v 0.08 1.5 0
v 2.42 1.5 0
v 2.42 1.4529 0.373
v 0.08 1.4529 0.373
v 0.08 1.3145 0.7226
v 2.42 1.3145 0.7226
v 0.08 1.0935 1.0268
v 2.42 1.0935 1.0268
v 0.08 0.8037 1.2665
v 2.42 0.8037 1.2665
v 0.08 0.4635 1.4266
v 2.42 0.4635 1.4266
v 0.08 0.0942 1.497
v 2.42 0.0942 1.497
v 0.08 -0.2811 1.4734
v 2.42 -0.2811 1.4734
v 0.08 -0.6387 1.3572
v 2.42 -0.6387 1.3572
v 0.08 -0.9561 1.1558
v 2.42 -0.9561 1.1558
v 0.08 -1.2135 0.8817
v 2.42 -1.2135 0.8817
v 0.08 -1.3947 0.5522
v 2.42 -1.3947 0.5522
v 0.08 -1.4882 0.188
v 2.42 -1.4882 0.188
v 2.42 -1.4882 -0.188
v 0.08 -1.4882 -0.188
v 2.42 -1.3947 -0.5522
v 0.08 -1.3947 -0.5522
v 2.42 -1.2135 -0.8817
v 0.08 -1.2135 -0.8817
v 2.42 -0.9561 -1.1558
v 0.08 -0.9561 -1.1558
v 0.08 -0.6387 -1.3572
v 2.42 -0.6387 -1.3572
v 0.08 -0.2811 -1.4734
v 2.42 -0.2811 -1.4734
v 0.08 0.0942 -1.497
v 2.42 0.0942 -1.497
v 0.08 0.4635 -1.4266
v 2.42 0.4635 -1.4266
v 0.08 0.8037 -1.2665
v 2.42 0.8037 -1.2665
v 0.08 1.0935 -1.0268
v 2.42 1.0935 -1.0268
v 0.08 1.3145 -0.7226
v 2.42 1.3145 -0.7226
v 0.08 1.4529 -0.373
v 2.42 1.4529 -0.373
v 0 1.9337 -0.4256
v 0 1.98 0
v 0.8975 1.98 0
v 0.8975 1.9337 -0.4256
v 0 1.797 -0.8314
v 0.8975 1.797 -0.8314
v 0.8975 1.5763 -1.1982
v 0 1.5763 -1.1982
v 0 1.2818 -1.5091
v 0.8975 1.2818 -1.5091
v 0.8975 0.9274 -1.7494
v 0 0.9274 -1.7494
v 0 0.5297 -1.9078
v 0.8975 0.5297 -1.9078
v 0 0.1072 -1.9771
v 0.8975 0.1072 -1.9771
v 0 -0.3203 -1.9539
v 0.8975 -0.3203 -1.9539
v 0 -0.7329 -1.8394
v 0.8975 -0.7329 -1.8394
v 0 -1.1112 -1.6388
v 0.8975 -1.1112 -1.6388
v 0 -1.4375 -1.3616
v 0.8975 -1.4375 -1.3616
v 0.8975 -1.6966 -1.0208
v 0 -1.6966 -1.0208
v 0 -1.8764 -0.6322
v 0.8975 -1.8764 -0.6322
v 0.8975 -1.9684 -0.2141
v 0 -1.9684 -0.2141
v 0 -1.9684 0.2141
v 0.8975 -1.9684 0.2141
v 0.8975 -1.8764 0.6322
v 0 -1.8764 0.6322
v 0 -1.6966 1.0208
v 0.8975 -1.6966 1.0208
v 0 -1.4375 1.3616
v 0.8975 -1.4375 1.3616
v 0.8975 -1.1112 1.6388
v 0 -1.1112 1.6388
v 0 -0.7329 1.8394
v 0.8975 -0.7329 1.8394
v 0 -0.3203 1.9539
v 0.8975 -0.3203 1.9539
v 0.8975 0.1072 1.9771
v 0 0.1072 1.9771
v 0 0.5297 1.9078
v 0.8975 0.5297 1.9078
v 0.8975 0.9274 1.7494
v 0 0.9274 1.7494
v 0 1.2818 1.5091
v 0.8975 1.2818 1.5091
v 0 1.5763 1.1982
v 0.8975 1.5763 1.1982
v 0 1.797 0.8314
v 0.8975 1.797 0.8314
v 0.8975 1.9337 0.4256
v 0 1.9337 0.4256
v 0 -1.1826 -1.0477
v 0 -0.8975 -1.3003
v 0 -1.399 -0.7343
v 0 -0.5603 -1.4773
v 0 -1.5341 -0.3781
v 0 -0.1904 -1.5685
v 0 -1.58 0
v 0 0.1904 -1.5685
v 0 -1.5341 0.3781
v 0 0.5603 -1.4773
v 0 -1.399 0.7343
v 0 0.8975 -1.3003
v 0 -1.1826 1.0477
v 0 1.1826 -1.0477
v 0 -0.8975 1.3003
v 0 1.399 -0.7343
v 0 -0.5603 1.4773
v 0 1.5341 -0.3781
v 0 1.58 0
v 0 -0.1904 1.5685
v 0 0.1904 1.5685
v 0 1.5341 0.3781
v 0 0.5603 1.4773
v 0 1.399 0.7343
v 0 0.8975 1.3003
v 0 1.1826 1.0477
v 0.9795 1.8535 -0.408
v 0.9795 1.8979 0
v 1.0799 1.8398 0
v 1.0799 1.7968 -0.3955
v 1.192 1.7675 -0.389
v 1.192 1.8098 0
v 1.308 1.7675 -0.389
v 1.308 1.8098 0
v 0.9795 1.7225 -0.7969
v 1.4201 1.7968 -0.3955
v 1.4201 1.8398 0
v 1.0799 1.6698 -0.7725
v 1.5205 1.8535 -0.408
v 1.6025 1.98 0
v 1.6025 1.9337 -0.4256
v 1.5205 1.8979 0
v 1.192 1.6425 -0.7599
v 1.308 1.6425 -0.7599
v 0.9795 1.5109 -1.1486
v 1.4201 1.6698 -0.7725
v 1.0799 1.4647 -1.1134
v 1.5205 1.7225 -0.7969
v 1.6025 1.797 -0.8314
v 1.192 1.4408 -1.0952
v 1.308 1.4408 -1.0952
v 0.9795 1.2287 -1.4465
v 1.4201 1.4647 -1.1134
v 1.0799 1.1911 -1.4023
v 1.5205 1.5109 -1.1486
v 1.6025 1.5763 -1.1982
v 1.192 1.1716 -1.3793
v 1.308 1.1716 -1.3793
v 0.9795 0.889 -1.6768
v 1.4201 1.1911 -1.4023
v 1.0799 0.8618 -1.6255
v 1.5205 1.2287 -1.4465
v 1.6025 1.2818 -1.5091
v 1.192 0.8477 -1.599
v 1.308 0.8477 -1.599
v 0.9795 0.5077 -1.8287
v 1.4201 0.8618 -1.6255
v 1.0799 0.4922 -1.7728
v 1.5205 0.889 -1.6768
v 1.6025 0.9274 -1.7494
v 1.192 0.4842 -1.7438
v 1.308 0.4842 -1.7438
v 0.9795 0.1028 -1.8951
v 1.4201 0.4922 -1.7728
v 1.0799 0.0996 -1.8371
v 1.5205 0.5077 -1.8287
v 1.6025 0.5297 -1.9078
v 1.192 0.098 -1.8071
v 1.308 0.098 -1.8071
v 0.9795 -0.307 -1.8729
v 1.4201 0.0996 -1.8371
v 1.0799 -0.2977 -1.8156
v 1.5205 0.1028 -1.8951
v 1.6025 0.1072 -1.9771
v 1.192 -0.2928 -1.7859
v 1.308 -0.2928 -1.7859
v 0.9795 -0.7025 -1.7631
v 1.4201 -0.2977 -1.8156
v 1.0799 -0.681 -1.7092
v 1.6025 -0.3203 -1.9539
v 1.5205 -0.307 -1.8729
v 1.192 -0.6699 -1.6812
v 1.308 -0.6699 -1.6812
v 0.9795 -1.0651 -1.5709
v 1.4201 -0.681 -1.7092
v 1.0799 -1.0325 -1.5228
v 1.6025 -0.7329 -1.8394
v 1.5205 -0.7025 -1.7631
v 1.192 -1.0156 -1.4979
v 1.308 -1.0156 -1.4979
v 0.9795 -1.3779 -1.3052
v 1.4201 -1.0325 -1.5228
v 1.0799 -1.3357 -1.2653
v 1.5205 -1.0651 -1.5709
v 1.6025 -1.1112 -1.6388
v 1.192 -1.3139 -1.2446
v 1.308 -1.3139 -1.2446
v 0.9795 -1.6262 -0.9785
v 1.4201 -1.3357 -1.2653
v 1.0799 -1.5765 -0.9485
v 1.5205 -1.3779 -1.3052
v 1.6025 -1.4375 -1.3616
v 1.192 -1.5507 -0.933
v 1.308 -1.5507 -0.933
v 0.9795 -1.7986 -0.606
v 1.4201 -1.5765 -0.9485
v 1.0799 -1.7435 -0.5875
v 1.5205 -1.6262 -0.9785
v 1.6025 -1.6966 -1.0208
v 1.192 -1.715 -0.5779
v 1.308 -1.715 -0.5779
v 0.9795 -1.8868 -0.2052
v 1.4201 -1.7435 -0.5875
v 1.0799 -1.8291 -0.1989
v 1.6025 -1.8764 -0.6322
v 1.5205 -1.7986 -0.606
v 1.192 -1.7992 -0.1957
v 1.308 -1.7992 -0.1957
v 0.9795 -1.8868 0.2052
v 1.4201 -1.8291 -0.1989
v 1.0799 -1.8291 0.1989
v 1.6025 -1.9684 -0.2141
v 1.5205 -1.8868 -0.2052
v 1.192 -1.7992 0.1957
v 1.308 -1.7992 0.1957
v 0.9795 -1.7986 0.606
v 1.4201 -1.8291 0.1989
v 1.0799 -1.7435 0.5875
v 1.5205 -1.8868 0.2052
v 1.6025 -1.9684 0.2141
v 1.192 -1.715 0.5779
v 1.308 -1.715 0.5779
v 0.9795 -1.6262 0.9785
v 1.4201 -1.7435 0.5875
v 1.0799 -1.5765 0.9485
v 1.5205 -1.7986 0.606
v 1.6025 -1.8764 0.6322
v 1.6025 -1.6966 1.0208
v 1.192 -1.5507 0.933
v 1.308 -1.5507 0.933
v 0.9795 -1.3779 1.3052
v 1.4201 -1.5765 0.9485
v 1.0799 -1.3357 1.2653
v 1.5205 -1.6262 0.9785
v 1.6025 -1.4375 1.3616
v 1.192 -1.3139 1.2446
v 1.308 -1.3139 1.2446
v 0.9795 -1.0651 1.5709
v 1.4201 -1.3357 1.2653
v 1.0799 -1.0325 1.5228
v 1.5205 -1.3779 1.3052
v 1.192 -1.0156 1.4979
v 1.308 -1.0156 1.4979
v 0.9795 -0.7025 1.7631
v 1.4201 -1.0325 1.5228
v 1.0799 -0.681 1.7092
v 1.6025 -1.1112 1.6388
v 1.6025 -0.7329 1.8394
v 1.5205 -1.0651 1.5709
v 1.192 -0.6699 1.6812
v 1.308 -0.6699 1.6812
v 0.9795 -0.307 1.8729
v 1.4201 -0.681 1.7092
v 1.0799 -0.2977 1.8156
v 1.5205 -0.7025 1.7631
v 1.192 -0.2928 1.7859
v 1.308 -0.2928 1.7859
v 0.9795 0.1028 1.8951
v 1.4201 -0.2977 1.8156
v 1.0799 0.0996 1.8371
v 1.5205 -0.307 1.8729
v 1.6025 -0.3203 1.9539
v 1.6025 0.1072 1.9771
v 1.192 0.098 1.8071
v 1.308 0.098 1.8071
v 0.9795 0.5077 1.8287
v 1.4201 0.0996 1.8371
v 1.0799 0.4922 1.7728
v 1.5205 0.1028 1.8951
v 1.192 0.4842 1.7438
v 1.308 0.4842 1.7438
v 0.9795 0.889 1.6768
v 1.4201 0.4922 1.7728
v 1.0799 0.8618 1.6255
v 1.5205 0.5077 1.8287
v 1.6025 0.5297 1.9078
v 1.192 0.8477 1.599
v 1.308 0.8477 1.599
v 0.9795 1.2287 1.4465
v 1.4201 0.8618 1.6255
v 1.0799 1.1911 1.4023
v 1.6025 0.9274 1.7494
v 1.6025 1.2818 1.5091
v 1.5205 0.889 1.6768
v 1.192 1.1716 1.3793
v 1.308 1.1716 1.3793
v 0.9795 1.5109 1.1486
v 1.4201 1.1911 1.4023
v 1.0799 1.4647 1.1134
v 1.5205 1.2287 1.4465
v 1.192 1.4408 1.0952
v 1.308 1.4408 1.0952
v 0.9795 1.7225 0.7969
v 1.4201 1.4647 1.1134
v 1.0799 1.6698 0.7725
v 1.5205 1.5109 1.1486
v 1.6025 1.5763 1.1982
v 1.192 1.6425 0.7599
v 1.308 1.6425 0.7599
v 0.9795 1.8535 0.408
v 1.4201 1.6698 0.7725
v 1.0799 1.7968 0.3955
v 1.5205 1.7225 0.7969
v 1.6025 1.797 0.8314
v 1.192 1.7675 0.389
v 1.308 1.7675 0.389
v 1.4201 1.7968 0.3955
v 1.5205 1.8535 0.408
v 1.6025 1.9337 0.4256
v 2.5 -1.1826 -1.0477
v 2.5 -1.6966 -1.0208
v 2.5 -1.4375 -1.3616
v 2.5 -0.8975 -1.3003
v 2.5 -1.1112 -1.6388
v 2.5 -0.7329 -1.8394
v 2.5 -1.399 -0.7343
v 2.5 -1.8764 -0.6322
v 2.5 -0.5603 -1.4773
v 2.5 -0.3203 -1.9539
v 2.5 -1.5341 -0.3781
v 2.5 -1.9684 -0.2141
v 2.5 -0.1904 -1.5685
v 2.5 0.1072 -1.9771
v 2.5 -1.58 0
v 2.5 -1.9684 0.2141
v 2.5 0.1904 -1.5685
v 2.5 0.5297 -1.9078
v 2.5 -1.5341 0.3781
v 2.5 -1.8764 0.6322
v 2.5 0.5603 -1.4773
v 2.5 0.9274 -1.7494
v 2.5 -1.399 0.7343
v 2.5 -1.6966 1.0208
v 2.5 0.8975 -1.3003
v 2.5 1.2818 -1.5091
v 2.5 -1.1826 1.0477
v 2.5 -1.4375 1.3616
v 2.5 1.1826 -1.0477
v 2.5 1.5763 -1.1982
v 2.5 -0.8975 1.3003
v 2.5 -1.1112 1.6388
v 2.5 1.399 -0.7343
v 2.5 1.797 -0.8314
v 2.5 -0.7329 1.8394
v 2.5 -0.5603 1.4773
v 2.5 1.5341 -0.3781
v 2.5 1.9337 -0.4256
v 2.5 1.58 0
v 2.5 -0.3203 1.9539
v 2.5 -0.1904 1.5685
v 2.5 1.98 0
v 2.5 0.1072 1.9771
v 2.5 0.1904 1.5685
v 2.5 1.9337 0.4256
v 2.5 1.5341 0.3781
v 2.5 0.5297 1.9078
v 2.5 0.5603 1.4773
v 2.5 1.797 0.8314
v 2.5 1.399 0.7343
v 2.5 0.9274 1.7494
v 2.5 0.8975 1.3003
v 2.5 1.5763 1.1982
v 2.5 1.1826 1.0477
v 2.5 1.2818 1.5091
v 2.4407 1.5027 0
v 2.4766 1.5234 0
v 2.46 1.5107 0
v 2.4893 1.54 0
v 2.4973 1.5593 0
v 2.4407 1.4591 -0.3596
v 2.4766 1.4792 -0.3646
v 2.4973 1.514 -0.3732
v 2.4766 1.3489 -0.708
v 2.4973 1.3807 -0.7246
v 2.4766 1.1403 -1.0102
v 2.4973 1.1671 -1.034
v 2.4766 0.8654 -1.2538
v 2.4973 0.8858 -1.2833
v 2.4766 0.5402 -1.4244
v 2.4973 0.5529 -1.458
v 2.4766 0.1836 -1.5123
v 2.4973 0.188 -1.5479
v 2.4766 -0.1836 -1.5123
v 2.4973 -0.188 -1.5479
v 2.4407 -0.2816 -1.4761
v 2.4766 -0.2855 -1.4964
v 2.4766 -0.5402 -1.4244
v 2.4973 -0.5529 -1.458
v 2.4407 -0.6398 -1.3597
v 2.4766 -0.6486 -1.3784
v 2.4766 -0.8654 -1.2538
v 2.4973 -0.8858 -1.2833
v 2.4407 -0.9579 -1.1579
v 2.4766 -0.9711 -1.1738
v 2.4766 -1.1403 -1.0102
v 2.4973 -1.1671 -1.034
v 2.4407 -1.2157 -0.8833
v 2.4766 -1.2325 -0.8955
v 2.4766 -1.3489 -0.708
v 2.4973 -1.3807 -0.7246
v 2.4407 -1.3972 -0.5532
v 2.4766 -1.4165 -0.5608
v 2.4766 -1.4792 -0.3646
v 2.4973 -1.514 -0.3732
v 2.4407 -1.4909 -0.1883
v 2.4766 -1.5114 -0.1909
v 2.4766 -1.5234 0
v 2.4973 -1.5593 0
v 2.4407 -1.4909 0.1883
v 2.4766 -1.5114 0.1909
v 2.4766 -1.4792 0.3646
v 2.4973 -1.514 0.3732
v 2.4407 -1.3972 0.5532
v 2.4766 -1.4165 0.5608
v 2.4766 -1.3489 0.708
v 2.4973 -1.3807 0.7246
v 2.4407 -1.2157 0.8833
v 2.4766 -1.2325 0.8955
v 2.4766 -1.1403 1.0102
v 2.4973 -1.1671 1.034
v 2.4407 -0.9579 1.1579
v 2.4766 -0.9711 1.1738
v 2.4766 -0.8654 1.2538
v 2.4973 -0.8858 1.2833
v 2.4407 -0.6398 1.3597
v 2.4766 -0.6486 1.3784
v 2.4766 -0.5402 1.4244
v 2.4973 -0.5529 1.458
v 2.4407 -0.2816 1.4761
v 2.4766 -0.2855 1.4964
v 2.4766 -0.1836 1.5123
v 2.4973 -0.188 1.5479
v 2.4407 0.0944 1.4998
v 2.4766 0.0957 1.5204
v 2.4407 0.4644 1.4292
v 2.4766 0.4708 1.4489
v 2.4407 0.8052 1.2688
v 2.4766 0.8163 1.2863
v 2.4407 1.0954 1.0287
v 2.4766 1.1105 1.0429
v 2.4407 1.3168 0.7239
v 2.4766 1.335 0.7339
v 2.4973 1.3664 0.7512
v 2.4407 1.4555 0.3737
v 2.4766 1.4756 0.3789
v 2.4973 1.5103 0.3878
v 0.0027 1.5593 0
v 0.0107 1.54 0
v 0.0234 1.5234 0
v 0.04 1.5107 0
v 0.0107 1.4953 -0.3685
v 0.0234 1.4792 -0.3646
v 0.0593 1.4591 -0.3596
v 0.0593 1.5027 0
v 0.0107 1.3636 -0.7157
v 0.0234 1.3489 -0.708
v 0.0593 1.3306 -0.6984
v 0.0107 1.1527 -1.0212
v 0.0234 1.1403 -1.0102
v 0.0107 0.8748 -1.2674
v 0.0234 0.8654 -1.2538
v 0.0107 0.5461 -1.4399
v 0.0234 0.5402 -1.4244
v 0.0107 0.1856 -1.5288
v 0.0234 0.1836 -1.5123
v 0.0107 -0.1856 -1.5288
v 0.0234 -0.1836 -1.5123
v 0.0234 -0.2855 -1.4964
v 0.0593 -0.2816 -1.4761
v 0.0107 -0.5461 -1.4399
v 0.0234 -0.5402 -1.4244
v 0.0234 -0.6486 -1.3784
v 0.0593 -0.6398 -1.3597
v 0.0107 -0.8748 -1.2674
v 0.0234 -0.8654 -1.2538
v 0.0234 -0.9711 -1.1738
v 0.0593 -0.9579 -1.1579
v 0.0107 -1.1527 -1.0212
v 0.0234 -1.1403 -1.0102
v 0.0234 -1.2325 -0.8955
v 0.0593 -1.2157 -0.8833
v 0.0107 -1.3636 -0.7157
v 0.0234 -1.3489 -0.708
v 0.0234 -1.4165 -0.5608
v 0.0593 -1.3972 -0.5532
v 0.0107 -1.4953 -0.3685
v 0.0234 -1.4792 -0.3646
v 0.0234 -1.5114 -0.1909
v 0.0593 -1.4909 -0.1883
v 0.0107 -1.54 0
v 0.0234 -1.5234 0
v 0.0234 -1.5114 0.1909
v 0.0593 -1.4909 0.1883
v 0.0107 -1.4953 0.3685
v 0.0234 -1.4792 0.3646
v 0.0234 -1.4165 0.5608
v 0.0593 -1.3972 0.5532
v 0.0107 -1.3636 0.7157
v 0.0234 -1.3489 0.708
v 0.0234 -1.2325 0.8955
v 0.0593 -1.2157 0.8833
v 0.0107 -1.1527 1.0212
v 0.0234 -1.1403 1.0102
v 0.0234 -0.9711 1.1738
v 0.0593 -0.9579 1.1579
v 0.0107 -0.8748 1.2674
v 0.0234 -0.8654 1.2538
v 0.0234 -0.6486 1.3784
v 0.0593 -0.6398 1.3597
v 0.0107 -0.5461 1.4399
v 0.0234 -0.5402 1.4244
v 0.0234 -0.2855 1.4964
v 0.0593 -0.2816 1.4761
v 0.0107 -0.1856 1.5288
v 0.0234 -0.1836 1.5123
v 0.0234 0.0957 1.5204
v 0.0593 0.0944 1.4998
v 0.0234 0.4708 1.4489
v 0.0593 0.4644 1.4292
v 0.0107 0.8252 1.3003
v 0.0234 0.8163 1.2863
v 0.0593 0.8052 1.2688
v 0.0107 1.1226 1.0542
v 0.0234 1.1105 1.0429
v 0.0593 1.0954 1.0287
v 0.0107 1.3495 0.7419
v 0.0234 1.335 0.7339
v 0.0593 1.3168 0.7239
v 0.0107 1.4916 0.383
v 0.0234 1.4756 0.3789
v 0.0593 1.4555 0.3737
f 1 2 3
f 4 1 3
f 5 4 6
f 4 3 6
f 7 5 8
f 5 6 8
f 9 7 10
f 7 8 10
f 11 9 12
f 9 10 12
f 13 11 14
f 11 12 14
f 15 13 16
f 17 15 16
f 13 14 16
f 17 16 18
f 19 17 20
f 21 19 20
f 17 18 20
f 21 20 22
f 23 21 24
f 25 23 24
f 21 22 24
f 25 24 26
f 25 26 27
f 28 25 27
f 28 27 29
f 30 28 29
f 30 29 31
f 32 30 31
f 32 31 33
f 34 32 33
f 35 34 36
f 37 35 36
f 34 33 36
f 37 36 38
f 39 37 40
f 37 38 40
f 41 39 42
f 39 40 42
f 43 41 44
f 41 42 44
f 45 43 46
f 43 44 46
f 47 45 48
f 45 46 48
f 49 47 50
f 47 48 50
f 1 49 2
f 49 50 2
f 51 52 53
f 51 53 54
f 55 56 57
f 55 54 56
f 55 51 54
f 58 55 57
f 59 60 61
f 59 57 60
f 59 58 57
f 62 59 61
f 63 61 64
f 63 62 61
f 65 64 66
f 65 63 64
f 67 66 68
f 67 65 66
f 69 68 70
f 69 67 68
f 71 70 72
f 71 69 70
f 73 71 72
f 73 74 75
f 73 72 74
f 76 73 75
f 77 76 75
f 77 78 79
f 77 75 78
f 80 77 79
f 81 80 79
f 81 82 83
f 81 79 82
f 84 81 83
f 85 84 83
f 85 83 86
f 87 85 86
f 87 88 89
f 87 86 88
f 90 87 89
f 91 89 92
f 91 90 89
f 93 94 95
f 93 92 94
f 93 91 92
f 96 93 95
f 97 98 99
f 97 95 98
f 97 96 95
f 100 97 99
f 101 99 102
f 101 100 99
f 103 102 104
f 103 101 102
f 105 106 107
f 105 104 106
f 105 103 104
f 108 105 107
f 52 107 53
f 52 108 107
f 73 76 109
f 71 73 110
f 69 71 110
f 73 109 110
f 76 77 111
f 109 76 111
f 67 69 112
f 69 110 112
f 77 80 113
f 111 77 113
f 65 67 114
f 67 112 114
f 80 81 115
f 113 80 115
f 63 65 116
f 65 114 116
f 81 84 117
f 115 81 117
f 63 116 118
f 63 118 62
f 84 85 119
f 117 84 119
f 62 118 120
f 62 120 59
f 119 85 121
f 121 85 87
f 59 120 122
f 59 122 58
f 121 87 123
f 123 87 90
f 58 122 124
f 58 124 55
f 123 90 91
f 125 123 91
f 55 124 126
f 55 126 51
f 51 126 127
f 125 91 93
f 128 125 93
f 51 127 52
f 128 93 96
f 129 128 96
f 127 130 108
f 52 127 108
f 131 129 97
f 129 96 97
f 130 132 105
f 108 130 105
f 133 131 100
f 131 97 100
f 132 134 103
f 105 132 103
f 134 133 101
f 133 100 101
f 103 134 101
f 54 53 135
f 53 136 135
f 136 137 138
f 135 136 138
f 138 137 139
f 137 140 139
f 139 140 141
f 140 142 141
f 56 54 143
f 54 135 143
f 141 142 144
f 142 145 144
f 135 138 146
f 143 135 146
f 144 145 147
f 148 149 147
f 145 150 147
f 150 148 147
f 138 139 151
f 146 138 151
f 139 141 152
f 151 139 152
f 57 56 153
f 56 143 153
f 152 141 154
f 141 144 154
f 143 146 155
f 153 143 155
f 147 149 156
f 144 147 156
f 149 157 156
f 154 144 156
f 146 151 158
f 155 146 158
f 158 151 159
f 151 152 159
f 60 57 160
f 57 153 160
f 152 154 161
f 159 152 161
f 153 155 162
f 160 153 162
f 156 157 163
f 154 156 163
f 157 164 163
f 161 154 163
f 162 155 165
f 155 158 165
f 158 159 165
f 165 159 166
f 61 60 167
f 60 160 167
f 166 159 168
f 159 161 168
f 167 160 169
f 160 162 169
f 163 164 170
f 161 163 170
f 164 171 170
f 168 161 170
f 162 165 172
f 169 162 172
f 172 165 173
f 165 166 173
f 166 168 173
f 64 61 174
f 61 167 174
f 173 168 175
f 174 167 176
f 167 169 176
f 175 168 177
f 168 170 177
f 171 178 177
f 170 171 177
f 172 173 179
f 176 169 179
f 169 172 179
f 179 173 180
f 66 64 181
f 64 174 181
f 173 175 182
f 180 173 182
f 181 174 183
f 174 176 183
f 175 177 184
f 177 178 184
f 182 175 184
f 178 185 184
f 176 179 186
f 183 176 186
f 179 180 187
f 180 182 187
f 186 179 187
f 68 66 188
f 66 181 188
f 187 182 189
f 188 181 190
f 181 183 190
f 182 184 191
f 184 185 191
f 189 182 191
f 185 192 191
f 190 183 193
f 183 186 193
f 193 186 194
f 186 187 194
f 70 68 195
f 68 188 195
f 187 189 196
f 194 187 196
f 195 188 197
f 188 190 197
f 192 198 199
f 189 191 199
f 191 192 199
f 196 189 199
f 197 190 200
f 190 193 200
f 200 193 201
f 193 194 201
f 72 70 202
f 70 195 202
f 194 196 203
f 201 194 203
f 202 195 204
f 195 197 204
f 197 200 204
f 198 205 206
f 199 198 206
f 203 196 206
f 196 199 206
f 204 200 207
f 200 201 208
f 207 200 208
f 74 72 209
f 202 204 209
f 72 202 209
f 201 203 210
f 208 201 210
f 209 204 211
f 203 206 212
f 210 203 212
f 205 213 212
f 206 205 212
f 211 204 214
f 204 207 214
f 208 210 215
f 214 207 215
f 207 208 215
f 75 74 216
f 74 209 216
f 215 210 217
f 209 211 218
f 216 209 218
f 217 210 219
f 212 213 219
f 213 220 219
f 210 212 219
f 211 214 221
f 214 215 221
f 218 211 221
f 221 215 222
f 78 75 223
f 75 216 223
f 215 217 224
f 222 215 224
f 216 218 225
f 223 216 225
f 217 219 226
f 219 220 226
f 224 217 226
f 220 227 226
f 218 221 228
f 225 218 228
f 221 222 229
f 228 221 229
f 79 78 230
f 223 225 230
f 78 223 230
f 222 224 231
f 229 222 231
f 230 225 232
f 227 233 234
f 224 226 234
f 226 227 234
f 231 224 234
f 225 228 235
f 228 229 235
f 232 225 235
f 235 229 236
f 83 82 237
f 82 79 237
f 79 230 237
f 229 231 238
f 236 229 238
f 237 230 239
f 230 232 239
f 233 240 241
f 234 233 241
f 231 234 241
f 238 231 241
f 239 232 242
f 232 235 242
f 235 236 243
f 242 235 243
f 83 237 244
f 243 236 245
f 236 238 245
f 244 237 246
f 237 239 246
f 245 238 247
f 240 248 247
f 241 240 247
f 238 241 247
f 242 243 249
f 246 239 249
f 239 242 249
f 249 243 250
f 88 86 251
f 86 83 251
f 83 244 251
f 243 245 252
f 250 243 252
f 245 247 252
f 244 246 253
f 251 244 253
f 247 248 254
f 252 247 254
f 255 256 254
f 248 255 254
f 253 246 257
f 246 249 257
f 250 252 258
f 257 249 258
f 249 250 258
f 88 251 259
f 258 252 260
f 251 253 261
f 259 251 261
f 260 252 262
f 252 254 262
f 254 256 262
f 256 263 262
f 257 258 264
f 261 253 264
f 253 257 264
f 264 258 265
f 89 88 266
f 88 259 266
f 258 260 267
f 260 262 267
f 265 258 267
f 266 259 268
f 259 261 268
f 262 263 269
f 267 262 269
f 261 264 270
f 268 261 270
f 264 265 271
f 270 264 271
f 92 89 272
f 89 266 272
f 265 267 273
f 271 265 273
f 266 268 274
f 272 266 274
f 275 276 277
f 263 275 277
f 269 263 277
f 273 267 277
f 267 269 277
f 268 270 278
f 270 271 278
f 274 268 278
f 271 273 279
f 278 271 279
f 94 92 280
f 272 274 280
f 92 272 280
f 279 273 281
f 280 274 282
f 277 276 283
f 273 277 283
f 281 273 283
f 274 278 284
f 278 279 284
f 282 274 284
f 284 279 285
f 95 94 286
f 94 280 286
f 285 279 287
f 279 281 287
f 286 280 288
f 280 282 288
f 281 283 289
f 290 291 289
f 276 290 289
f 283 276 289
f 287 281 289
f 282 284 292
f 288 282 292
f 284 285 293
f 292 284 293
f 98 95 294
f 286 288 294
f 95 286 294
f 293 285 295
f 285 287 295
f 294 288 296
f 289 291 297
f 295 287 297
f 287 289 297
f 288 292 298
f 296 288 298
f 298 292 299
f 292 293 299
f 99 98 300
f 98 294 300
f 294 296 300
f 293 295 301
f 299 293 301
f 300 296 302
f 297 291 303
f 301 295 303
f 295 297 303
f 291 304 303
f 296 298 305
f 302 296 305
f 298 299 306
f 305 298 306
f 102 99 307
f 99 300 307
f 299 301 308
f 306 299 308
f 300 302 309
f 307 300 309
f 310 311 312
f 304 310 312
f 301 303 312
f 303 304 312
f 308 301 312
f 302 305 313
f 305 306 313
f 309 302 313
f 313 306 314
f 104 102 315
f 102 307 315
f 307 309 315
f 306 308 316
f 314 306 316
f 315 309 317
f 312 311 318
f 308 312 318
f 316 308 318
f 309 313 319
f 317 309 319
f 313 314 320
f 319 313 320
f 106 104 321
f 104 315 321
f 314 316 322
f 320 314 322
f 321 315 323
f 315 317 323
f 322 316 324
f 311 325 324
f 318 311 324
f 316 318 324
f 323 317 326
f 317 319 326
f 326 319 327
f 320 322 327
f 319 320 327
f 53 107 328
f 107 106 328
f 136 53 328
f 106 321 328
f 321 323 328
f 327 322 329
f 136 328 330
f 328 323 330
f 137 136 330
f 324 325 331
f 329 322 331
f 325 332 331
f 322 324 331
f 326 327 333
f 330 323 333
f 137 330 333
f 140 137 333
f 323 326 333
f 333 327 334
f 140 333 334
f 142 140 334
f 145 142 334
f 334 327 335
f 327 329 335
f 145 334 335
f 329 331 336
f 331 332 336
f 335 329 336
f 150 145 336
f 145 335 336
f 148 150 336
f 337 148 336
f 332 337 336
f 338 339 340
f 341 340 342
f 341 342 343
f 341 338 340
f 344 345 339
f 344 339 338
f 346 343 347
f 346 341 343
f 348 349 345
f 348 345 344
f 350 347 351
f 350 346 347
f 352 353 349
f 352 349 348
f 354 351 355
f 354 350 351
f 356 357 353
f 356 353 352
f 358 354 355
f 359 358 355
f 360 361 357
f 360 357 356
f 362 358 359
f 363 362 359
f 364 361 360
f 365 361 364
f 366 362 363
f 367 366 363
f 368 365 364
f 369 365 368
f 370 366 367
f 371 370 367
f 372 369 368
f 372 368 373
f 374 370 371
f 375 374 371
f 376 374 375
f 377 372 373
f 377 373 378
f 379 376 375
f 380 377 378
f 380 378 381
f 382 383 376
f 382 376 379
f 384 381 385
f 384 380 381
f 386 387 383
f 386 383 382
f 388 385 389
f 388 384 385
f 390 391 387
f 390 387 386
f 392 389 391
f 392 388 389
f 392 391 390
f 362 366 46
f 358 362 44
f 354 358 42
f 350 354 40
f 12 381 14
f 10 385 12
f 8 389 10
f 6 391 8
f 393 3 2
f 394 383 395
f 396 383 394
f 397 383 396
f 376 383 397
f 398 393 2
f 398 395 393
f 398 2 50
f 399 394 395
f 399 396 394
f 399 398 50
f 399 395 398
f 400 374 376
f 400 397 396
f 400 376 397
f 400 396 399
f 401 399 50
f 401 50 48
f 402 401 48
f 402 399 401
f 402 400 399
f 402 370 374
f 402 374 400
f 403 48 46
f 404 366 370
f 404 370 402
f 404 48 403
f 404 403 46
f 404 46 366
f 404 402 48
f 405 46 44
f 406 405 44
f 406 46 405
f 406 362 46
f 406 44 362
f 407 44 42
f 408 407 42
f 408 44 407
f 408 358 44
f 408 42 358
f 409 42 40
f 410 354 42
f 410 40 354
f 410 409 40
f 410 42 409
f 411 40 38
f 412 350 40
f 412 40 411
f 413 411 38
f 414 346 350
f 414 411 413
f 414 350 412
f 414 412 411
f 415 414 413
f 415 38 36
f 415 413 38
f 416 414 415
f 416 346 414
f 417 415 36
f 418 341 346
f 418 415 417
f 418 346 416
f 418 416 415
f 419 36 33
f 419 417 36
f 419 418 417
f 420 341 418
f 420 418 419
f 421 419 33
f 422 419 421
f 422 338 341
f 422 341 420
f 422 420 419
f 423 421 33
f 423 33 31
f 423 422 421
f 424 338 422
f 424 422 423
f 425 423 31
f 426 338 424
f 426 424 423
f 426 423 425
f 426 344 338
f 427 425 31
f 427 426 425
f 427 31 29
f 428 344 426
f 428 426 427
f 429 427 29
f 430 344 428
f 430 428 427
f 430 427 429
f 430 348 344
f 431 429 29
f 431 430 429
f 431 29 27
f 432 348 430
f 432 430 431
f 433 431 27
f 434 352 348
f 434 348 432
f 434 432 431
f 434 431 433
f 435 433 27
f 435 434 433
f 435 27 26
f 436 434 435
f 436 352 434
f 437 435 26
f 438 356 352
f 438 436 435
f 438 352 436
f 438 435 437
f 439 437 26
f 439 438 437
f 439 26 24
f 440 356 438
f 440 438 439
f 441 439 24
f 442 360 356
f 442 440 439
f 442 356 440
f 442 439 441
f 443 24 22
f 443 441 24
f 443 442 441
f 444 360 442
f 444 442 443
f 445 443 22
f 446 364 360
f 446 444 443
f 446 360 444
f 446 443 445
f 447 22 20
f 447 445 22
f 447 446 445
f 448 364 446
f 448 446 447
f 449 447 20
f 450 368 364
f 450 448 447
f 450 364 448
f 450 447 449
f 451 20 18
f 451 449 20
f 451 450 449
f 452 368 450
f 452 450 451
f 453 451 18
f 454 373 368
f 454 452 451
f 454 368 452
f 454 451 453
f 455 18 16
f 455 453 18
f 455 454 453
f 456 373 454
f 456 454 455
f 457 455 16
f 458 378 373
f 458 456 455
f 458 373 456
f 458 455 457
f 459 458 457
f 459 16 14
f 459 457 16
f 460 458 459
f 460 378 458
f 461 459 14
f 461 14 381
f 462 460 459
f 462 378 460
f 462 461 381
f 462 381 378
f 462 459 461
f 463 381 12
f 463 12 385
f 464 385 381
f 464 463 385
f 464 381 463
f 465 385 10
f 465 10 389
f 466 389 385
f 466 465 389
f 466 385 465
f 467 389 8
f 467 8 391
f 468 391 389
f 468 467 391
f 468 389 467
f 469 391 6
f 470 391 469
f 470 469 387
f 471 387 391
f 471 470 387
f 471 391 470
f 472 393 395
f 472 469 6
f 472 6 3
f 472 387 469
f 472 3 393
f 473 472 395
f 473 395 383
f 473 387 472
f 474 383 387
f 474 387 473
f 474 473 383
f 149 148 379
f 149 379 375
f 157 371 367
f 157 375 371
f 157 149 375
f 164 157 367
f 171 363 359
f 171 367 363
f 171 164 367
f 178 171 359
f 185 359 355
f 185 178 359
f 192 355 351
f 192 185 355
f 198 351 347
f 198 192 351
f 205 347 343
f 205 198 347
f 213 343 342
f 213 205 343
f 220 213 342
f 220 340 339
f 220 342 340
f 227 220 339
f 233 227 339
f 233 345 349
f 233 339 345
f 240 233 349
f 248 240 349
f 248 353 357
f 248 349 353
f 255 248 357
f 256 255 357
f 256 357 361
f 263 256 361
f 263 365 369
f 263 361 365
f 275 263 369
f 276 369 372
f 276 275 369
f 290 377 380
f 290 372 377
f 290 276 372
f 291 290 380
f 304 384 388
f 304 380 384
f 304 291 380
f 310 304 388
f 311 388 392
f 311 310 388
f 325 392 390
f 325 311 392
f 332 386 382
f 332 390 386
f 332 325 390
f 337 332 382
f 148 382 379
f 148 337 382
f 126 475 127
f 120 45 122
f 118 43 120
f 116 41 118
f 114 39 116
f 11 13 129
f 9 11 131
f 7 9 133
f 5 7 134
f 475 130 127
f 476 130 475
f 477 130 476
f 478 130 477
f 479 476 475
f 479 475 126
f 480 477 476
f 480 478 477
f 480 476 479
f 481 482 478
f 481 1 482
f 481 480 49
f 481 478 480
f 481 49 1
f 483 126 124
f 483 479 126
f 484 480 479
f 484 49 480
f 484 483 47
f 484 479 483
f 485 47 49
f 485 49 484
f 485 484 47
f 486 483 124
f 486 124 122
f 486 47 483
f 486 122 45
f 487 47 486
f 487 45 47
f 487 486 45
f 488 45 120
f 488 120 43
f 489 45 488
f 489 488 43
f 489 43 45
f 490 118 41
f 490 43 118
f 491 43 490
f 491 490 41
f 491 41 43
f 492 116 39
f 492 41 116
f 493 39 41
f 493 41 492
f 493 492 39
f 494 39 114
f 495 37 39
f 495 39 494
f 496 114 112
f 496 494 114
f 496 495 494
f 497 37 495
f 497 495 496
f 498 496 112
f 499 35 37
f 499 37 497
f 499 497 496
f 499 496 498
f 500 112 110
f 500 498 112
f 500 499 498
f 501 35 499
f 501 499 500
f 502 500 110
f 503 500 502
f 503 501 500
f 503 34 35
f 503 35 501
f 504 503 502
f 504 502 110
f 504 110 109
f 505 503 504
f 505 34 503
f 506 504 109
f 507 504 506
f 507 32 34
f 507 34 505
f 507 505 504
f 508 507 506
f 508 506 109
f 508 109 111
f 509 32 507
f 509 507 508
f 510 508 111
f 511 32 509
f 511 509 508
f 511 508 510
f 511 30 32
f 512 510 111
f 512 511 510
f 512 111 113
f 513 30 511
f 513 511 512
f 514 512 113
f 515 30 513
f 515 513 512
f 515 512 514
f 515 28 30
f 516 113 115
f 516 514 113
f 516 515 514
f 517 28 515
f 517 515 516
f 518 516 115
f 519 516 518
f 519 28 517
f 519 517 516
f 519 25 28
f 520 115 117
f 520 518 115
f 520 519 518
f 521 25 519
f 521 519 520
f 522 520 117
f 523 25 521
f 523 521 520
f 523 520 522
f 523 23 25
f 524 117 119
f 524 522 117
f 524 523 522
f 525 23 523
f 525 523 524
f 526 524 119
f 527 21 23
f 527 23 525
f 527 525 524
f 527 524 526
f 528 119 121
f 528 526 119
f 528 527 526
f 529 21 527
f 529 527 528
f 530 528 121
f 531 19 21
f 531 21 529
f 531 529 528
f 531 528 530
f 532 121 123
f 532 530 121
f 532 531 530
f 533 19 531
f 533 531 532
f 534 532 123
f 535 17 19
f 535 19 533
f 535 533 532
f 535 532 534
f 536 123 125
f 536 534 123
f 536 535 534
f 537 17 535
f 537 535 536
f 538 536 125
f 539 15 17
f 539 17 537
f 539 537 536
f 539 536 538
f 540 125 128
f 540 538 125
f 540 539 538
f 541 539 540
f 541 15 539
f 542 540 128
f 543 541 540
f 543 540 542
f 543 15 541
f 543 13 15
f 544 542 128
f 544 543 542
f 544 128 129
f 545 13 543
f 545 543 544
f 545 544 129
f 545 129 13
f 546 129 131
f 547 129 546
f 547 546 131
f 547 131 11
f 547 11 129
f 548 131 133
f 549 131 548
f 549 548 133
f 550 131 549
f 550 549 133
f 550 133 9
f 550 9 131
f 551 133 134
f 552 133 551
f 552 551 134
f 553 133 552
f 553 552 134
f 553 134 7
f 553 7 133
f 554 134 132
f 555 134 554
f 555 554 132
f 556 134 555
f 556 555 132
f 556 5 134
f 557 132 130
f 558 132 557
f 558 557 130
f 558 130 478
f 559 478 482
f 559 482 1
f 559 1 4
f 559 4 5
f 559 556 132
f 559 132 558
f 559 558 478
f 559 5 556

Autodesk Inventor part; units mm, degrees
sketch "Sketch_2" plane through (0, 0, 0) normal (0, 0, 1) x (1, 0, 0)
  line L0 (2.5, 0) -> (0, 0)
  arc A0 (0, 1.58) -> (0.08, 1.5) centre (0.08, 1.58) ccw
  line L1 (0.08, 1.5) -> (2.42, 1.5)
  arc A1 (2.42, 1.5) -> (2.5, 1.58) centre (2.42, 1.58) ccw
  line L2 (2.5, 1.58) -> (2.5, 1.98)
  line L3 (2.5, 1.98) -> (1.6025, 1.98)
  arc A2 (0.8975, 1.98) -> (1.6025, 1.98) centre (1.25, 2.25) ccw
  line L4 (0.8975, 1.98) -> (0, 1.98)
  line L5 (0, 1.98) -> (0, 1.58)
revolve "Revolution1" add sketch "Sketch_2" angle 360 about axis through (2.5, 0, 0) along (1, 0, 0)
ref_plane "mss_ir_XY" through (0, 0, 0) normal (1, 0, 0) x (0, 0, -1)
ref_plane "mss_ir_YZ" through (0, 0, 0) normal (0, 0, -1) x (0, 1, 0)
ref_plane "mss_ir_ZX" through (0, 0, 0) normal (0, 1, 0) x (1, 0, 0)
properties part number "WA673SA Inner ring"
